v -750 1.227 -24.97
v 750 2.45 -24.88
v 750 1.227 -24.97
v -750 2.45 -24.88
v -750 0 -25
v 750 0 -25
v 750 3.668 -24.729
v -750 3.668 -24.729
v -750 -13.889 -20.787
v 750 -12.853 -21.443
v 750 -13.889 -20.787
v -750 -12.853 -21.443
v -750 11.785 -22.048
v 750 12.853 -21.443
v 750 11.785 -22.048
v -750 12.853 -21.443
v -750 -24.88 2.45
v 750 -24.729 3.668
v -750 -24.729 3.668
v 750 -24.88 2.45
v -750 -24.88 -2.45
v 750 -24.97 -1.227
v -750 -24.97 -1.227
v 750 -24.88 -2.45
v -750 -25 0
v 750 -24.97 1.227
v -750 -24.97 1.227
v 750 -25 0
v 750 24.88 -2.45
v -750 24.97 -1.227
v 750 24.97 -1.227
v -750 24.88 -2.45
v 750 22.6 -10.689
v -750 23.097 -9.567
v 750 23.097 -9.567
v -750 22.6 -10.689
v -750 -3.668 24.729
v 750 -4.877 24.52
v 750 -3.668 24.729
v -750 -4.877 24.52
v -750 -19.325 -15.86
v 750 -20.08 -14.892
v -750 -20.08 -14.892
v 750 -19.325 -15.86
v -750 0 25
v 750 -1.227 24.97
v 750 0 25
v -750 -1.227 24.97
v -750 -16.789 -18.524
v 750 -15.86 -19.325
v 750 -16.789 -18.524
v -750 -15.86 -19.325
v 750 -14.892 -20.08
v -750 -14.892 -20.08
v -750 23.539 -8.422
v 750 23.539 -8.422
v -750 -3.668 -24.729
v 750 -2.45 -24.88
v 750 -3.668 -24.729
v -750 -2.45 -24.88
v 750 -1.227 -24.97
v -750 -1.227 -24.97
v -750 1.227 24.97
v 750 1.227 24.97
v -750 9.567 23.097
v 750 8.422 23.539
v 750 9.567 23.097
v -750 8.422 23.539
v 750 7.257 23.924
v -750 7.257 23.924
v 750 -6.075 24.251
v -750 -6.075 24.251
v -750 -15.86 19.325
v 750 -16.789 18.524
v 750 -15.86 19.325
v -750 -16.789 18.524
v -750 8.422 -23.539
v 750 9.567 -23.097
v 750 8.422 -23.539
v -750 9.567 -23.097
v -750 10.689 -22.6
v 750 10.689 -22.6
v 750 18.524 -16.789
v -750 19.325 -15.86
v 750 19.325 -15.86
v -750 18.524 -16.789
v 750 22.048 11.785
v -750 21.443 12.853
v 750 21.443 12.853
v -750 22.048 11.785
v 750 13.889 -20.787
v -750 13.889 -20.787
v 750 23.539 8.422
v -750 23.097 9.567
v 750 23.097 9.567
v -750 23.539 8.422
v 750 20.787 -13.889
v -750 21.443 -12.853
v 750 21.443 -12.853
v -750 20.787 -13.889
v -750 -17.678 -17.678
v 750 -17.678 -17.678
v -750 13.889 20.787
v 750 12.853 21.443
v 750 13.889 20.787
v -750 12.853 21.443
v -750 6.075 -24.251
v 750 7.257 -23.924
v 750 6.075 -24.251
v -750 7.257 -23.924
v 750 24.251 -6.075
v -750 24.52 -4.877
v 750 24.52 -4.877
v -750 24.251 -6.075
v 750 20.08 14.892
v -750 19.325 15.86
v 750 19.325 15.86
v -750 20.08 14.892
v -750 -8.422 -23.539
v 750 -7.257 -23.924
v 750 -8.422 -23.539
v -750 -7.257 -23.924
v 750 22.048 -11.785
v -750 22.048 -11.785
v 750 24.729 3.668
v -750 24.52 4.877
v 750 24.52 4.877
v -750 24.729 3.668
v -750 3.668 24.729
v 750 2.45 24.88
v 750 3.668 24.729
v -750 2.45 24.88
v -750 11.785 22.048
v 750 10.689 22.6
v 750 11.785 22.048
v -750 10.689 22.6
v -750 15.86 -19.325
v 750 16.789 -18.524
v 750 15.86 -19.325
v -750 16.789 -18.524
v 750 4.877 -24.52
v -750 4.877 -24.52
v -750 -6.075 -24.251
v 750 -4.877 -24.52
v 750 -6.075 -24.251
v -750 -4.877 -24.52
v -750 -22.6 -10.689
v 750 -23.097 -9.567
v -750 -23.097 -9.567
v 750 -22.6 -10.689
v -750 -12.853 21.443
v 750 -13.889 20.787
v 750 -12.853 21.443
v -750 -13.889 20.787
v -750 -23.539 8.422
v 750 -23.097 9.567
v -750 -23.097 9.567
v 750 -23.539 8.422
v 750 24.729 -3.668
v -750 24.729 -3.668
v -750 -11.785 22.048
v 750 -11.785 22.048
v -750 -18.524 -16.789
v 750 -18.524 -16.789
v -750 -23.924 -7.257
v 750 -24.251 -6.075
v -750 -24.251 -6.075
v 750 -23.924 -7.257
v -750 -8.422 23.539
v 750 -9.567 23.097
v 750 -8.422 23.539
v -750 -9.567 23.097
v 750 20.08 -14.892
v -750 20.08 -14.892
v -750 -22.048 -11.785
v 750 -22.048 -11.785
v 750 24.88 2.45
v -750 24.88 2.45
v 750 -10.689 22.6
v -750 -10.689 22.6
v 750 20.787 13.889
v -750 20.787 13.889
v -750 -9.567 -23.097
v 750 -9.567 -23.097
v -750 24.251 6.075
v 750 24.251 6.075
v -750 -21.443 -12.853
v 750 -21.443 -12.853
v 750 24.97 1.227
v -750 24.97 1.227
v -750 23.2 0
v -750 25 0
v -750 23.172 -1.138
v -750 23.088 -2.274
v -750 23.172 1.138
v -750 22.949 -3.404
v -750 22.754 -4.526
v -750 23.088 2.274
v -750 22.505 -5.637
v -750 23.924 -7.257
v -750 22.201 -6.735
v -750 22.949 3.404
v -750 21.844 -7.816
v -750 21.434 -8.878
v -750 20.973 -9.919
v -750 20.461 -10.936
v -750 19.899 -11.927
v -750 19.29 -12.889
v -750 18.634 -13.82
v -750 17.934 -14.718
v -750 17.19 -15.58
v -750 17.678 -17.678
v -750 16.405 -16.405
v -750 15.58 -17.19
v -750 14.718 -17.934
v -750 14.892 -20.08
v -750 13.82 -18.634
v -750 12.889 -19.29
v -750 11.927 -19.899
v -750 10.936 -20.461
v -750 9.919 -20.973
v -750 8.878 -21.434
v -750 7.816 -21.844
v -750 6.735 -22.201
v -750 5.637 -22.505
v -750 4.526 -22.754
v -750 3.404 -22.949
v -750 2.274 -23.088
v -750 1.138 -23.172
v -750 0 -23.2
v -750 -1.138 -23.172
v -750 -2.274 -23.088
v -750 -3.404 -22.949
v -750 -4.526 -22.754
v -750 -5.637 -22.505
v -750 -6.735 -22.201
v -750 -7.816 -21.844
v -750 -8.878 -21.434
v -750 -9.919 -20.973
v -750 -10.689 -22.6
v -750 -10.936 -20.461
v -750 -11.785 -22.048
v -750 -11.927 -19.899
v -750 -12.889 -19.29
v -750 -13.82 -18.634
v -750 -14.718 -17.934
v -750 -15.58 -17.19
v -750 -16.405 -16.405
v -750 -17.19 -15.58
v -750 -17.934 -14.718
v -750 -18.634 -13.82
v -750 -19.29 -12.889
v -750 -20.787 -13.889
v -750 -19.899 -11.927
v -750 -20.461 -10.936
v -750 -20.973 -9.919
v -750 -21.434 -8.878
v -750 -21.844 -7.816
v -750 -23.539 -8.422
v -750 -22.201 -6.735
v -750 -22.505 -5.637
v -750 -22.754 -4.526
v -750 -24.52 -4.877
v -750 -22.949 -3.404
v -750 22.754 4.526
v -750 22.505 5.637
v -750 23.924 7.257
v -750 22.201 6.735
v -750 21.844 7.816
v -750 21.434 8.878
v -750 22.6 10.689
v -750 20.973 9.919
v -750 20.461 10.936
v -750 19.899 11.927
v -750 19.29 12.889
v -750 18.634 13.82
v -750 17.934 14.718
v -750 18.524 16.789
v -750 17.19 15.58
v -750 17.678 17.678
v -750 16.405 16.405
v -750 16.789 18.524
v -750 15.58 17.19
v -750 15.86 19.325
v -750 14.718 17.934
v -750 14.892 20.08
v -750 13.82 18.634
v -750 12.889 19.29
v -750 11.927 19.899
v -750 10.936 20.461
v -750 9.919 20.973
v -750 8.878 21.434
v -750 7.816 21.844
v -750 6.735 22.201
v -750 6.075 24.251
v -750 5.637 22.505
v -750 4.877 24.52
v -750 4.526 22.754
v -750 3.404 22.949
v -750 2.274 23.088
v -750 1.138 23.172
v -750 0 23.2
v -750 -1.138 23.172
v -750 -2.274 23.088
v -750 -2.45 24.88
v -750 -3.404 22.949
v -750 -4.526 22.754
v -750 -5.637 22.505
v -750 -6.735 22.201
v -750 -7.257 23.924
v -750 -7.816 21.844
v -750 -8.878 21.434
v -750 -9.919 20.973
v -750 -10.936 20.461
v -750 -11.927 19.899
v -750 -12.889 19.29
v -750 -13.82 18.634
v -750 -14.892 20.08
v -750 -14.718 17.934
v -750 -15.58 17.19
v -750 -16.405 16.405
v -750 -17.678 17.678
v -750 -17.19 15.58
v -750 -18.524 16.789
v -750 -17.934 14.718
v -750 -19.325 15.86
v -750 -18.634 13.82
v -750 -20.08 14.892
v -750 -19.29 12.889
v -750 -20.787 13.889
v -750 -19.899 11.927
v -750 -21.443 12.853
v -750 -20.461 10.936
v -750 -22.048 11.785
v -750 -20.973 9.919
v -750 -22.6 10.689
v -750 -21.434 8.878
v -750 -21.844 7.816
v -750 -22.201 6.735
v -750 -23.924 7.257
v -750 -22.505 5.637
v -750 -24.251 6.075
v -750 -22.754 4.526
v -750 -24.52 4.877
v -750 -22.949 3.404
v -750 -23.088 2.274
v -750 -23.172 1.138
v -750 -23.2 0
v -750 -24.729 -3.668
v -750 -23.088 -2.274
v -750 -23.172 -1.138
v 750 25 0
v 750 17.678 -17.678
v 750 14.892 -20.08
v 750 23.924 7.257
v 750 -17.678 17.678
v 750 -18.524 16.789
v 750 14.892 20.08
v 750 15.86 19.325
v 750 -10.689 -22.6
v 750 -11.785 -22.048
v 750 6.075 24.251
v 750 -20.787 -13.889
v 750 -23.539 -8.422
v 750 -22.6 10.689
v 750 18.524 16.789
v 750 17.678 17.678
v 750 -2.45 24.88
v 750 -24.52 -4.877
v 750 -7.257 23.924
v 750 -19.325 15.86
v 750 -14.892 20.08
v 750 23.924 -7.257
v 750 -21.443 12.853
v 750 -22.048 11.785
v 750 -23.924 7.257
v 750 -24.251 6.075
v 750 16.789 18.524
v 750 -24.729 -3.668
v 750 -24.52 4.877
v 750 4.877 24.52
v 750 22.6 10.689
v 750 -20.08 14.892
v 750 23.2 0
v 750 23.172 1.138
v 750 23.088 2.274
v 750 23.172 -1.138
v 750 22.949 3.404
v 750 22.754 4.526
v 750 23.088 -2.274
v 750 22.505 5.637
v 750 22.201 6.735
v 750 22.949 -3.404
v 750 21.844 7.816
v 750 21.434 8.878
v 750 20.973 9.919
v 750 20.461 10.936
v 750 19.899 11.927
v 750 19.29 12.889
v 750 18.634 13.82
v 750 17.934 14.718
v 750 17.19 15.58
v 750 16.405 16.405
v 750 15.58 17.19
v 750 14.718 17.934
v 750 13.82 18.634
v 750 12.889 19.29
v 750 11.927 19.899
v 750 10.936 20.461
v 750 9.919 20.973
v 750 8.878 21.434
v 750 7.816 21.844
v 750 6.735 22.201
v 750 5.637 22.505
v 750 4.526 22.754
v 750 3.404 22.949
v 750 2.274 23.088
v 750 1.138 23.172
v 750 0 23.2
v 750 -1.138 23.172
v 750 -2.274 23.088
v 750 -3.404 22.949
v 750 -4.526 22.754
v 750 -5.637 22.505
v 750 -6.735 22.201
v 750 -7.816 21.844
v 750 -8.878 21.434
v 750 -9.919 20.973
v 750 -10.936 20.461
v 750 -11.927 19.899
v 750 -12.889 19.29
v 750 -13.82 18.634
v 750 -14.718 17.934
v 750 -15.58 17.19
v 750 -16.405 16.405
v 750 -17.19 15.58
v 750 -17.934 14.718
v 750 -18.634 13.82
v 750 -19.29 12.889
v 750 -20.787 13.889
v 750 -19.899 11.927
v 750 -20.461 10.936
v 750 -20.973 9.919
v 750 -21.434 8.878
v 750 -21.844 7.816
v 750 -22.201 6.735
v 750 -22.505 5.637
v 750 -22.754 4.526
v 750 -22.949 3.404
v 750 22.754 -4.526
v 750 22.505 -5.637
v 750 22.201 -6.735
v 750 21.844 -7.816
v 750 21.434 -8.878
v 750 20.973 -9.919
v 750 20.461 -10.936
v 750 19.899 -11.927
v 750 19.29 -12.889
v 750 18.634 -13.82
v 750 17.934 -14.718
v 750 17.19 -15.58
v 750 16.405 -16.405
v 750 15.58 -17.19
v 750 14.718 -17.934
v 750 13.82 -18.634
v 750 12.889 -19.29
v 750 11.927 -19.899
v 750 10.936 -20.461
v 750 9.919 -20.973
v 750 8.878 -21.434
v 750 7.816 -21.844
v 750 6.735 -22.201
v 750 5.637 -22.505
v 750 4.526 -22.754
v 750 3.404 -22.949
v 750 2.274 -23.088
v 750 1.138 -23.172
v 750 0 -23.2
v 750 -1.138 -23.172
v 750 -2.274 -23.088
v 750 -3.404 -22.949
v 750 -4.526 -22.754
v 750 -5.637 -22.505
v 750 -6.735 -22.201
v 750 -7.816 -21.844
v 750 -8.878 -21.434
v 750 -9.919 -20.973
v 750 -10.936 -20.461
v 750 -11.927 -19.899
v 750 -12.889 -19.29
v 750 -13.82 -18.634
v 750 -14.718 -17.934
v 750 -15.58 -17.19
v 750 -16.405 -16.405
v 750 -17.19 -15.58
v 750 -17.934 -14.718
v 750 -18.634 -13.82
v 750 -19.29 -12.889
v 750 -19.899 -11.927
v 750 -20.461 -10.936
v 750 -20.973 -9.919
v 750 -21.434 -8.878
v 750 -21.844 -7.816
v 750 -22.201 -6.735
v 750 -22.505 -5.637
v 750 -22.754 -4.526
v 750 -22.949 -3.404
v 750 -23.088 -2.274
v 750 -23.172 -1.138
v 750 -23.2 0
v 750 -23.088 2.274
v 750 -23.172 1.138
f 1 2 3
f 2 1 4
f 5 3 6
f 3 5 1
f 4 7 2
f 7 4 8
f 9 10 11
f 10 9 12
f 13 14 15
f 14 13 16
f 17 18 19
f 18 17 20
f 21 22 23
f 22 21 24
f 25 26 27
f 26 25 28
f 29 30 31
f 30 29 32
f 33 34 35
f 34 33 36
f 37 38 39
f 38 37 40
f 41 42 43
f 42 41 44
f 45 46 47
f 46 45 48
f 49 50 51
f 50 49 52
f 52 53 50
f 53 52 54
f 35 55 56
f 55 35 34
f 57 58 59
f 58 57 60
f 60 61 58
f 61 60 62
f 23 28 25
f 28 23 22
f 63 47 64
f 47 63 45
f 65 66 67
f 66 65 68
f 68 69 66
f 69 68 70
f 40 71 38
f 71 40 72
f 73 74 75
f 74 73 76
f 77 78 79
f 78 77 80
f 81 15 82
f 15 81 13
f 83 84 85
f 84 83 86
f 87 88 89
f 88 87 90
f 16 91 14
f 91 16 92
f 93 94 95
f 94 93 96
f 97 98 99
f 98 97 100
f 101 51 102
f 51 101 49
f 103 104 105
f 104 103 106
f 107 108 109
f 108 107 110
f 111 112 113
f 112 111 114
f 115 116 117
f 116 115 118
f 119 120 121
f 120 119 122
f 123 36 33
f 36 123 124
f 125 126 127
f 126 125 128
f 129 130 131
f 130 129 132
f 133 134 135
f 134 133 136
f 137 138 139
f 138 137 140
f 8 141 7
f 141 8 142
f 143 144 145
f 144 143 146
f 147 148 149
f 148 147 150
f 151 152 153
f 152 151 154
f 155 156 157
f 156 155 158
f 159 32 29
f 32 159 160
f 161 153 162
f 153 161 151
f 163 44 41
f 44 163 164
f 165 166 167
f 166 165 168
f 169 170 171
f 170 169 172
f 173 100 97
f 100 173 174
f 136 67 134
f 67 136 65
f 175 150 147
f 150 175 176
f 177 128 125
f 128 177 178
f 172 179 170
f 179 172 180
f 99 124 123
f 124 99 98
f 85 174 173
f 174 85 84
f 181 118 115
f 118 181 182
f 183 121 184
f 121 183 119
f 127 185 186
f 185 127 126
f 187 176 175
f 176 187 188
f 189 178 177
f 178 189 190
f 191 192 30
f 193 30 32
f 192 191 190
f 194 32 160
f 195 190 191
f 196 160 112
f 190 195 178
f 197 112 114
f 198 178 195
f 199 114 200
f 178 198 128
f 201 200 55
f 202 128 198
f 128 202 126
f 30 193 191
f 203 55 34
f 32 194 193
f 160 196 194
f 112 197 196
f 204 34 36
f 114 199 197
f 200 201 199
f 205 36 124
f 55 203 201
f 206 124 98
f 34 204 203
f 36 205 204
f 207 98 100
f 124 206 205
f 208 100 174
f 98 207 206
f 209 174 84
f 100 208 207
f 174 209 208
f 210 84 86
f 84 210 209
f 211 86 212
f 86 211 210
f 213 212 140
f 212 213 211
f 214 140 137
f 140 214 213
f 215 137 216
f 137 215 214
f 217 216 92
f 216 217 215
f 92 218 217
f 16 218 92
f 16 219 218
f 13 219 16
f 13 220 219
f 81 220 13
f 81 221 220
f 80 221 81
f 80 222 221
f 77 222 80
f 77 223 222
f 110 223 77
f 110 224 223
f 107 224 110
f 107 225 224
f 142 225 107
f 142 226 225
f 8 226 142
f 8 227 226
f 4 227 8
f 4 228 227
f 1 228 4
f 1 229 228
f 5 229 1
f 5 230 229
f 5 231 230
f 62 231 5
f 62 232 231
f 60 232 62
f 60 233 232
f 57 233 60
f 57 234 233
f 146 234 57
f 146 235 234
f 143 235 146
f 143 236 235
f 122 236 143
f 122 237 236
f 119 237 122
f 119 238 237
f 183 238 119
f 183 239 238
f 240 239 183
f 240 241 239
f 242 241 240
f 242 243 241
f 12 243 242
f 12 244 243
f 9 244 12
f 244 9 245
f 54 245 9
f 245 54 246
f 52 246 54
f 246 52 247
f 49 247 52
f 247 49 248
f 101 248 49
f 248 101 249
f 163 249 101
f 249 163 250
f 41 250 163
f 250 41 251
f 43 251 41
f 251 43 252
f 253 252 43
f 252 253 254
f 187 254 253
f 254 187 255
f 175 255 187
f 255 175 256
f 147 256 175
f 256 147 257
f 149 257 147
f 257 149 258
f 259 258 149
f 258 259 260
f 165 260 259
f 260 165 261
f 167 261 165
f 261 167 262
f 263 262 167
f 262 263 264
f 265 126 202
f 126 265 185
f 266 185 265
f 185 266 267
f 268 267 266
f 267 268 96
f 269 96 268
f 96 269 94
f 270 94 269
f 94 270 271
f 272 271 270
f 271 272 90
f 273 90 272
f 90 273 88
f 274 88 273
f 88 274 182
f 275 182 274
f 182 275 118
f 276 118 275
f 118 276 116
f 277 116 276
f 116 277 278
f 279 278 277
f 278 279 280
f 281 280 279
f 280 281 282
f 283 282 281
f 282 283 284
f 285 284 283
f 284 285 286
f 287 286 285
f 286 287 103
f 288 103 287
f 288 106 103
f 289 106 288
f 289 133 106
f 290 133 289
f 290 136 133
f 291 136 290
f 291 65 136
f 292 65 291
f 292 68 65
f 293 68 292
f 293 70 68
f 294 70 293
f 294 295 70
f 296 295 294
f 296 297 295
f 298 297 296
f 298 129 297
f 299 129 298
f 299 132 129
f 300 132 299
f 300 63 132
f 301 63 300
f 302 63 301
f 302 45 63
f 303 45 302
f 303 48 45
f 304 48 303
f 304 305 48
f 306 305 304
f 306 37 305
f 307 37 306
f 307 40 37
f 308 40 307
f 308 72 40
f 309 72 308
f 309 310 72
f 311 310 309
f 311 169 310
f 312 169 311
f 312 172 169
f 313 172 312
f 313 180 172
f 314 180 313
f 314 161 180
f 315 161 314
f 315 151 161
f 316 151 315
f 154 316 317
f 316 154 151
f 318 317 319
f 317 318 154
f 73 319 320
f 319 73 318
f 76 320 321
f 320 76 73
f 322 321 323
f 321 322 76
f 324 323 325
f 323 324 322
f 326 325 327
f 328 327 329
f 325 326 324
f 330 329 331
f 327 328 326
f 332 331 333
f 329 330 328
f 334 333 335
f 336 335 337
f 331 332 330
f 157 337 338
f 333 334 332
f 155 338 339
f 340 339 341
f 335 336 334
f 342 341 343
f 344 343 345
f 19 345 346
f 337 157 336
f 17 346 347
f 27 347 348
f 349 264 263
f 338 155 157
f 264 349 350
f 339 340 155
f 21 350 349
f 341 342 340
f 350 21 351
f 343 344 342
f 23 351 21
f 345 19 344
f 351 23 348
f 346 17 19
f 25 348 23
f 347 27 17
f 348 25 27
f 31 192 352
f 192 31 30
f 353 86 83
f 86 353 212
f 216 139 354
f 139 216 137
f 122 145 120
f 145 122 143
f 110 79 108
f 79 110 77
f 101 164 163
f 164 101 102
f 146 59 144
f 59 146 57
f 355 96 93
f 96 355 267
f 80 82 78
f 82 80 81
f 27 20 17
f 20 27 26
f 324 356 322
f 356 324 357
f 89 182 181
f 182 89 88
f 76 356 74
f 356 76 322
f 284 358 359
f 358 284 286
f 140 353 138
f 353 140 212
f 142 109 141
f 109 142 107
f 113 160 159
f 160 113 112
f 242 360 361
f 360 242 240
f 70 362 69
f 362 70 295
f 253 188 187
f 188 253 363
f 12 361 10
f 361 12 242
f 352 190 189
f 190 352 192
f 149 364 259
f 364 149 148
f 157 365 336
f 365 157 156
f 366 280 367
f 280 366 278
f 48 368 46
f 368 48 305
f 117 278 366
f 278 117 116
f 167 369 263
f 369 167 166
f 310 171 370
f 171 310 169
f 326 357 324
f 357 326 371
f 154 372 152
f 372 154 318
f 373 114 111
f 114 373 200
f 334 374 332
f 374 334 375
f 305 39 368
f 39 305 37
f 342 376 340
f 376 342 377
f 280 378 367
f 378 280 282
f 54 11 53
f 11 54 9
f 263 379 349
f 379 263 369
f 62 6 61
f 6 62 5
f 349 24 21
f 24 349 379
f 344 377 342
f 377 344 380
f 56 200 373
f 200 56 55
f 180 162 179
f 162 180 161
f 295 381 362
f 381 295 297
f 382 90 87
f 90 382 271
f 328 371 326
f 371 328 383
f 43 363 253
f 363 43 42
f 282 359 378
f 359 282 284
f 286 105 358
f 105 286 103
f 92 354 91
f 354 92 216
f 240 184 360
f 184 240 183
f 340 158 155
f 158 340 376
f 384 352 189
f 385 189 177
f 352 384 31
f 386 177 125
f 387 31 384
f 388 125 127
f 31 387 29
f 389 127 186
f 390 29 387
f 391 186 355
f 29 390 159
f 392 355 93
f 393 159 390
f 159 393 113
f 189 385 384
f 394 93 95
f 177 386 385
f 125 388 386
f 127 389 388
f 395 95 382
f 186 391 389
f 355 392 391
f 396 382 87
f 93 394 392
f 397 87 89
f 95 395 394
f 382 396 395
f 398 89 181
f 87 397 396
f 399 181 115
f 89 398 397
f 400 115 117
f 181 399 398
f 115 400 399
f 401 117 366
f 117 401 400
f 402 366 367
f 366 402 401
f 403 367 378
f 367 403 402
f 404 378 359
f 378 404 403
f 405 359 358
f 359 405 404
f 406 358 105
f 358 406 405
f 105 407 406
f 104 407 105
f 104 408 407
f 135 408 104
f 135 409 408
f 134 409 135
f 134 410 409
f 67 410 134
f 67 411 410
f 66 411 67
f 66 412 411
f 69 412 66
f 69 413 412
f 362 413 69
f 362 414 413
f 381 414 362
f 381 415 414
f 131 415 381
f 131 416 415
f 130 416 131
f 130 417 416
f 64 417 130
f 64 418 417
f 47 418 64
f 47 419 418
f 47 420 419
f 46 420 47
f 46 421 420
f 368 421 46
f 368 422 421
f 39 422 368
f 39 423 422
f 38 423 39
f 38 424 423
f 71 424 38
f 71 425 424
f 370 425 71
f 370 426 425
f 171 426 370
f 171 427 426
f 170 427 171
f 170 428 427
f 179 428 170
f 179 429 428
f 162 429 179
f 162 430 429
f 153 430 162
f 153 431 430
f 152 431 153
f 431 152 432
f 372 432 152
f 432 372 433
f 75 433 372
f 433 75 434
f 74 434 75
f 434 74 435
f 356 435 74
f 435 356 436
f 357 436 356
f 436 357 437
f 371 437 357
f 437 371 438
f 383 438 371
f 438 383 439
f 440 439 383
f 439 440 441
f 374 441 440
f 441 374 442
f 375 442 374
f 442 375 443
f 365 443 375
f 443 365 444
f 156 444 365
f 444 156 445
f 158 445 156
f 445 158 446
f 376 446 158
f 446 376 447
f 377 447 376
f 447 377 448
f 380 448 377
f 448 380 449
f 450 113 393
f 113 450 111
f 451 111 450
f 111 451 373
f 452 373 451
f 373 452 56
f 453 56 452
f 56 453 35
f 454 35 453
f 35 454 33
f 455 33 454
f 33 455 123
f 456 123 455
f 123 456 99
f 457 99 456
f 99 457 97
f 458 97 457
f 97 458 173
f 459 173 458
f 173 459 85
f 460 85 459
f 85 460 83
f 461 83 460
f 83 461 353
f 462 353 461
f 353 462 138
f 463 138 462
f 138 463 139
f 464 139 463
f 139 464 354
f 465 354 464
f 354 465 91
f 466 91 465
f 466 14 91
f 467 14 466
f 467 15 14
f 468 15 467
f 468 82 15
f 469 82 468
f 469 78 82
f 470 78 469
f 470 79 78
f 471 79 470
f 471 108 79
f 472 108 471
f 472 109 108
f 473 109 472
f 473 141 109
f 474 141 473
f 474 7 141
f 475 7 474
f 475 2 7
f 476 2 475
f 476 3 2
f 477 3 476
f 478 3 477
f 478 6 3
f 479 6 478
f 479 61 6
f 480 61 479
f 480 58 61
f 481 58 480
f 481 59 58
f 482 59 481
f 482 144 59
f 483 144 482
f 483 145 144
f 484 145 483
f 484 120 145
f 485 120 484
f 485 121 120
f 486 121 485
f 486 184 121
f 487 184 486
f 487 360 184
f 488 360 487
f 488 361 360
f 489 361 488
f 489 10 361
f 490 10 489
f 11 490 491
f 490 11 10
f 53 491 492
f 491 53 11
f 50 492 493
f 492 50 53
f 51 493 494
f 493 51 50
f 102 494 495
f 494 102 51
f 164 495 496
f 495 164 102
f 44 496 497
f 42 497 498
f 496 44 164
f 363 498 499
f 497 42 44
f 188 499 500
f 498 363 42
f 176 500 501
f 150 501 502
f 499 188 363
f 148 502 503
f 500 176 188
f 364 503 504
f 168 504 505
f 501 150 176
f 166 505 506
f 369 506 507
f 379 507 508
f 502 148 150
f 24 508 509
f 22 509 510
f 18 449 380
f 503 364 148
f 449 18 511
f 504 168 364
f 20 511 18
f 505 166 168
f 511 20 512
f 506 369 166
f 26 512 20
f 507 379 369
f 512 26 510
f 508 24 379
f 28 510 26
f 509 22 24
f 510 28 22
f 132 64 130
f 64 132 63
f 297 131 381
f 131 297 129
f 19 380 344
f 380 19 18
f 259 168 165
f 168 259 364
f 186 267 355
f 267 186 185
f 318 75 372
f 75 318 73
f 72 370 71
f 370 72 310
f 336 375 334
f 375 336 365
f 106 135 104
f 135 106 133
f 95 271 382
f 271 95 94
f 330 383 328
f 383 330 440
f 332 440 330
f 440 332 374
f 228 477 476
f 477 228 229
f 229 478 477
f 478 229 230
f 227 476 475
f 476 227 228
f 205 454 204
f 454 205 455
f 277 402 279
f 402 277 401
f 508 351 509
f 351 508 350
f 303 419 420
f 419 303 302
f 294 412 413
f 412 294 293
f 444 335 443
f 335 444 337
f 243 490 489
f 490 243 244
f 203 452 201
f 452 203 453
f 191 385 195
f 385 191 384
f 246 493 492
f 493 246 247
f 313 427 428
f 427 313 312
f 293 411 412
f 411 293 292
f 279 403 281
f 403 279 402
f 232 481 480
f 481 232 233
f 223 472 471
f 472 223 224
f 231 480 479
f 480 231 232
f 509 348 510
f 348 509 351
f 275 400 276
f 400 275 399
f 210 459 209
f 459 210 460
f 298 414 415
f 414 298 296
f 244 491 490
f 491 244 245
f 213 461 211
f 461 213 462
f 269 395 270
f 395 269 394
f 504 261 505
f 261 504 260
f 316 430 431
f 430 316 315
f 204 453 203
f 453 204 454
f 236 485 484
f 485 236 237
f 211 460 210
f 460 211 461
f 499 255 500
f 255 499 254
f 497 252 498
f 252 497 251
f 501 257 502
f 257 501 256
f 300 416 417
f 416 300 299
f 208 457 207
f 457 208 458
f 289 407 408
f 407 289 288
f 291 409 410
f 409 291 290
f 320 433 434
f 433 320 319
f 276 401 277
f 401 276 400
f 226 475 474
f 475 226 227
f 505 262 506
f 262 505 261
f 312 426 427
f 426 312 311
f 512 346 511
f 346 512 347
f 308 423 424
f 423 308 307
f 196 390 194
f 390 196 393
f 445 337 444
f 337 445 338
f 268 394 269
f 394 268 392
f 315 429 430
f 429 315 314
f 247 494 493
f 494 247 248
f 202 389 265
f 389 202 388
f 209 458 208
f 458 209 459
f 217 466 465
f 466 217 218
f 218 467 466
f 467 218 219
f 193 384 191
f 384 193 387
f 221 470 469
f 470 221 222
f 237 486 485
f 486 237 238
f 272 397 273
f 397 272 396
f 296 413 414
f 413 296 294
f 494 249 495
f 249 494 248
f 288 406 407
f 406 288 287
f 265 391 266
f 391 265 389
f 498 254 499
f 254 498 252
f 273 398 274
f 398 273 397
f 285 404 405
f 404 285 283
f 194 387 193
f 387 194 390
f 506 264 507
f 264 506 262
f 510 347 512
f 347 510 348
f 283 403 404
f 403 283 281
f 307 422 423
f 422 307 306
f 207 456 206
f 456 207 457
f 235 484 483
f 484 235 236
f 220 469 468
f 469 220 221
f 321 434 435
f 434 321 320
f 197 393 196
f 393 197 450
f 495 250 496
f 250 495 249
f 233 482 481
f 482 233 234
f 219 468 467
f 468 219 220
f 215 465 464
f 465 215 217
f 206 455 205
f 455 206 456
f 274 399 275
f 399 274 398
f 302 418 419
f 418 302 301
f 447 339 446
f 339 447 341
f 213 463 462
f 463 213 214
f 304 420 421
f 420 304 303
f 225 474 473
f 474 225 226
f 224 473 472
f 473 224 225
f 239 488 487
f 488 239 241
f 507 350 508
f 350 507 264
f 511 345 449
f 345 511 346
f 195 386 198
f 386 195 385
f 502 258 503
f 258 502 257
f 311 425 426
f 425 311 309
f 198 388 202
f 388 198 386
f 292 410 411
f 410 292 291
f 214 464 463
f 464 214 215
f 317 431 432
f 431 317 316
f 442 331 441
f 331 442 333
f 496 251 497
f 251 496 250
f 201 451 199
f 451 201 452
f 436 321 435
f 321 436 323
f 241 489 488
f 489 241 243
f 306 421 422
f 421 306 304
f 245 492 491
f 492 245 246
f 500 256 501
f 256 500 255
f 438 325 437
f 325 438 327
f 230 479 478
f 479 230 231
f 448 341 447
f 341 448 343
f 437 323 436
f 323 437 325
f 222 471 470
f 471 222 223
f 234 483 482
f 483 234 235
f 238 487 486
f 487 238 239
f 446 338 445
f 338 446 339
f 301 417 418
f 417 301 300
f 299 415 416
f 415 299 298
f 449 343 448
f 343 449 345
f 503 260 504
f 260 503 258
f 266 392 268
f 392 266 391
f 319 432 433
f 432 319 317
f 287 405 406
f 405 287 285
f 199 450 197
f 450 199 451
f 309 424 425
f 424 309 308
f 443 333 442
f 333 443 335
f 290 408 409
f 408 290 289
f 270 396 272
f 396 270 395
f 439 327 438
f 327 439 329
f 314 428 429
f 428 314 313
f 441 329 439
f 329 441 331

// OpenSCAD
$fn = 128;

// HT 50 pipe (nominal) - 1500 mm length
pipe_length     = 1500;   // mm
outer_diameter  = 50;     // mm
wall_thickness  = 1.8;    // mm
inner_diameter  = outer_diameter - 2*wall_thickness;

// Orient along X so FRONT/BACK/LEFT/RIGHT orthographic views show the full 1500 mm length
module ht_pipe(od, id, len) {
    rotate([0, 90, 0])  // Z-axis cylinder -> X-axis pipe
    difference() {
        cylinder(h=len, d=od, center=true);
        cylinder(h=len + 2, d=id, center=true); // slightly longer for clean through-hole
    }
}

ht_pipe(outer_diameter, inner_diameter, pipe_length);
